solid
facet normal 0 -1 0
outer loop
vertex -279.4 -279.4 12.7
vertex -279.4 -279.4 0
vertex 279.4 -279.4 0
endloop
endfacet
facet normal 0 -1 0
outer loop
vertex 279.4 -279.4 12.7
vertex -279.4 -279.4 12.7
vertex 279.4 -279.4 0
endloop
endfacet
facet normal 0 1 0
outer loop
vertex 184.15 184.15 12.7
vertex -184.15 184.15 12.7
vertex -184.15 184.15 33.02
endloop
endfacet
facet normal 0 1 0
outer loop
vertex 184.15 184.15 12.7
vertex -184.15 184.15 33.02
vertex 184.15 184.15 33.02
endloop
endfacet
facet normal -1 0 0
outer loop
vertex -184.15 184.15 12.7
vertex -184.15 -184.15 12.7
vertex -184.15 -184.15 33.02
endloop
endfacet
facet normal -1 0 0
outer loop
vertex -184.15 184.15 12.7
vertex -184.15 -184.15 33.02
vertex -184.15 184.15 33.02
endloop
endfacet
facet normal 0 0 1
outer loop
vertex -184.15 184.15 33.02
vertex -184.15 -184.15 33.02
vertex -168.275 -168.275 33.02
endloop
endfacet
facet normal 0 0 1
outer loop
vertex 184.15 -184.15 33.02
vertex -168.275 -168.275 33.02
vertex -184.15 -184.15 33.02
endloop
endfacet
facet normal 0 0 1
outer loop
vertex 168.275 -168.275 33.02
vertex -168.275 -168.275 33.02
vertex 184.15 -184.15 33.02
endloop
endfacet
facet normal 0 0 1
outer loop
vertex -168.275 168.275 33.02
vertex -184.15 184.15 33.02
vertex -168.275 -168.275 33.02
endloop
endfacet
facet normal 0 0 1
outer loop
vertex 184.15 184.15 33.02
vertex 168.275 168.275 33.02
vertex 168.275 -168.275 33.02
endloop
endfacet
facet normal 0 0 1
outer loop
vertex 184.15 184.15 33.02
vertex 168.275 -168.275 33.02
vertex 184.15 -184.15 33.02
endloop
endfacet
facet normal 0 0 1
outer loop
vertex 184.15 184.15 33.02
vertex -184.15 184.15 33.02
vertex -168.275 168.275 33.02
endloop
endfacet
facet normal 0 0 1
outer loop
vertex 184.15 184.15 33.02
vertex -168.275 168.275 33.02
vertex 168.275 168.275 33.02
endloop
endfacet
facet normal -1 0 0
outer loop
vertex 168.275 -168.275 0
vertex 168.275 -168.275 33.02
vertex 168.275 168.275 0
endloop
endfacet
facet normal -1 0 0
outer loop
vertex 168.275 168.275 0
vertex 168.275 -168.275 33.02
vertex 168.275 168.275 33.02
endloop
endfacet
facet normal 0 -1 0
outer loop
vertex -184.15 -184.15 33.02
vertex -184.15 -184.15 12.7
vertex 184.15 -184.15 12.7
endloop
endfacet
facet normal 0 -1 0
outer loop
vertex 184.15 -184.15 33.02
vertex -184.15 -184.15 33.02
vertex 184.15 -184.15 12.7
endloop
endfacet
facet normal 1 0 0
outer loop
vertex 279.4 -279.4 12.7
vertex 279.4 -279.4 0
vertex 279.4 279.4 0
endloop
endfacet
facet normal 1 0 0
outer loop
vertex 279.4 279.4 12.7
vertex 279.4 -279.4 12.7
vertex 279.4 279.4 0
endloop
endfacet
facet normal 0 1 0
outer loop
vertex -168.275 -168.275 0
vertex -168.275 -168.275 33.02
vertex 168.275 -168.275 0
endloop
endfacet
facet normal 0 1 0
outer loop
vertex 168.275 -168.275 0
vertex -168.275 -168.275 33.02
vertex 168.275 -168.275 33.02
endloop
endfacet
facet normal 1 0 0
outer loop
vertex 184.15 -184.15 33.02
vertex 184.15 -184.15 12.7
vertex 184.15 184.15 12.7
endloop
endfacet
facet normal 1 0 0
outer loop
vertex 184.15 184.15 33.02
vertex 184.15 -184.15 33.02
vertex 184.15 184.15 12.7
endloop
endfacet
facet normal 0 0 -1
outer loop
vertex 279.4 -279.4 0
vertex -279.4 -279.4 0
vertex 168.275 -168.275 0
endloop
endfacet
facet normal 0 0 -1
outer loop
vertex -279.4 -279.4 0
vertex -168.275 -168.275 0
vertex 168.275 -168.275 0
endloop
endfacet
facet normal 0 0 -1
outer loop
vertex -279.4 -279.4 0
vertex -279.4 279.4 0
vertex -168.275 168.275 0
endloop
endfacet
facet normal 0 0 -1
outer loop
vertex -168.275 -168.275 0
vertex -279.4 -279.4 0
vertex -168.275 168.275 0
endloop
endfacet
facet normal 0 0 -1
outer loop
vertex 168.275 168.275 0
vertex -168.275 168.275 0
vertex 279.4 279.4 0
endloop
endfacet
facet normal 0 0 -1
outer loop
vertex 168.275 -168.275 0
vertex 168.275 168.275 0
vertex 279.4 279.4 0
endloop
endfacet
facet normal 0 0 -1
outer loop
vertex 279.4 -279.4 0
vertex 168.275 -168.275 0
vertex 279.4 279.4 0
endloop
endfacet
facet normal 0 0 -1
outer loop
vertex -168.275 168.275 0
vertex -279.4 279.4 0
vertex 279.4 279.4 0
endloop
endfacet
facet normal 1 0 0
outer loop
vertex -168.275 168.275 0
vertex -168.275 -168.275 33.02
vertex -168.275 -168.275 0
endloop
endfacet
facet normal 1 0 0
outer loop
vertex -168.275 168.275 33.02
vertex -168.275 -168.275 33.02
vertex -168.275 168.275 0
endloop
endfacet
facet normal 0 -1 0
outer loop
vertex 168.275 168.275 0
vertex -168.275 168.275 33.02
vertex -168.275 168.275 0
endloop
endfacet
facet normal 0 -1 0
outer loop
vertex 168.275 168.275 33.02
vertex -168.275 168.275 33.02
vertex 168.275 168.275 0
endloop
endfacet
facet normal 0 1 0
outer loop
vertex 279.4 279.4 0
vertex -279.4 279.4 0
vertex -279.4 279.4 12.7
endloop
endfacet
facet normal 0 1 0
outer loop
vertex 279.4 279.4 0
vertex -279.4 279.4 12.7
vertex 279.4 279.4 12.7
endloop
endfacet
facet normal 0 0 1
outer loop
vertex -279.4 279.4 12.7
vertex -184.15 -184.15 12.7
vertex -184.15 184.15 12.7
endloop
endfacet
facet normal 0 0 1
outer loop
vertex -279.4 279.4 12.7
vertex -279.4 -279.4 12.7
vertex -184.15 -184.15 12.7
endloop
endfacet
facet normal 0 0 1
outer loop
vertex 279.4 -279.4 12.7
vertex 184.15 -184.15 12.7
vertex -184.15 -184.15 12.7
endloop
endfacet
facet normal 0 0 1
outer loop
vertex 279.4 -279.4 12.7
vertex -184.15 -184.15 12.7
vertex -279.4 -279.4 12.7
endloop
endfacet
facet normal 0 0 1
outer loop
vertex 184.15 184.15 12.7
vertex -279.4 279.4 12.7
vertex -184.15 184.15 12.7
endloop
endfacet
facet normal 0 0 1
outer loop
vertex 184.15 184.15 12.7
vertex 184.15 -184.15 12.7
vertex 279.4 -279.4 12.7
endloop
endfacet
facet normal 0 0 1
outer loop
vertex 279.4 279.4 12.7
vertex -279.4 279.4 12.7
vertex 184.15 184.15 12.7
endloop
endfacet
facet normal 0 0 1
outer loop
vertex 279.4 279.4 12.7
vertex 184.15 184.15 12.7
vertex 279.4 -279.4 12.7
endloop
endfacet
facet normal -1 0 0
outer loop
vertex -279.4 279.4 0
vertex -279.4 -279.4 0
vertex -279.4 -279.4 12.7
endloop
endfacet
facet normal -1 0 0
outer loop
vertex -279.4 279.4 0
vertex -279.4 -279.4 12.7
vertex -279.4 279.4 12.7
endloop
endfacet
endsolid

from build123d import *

# Parameters (mm, degrees)
F0_W     = 558.8
F0_H     = 558.8
F1_DEPTH = 12.7
F2_W     = 368.3
F2_H     = 368.3
F3_DEPTH = 20.32
F4_W     = 336.55
F4_H     = 336.55
F5_DEPTH = 121.92


with BuildPart() as f1:
    # F0 (on Top) → F1 (new body)
    with BuildSketch(Plane.XY):
        Rectangle(F0_W, F0_H)
    extrude(amount=F1_DEPTH)

    # F2 (on face) → F3 (join)
    with BuildSketch(Plane.XY.offset(12.7)):
        Rectangle(F2_W, F2_H)
    extrude(amount=F3_DEPTH)

    # F4 (on face) → F5 (cut)
    with BuildSketch(Plane.XY.offset(33.02)):
        Rectangle(F4_W, F4_H)
    extrude(amount=-F5_DEPTH, mode=Mode.SUBTRACT)


solid = f1.part
